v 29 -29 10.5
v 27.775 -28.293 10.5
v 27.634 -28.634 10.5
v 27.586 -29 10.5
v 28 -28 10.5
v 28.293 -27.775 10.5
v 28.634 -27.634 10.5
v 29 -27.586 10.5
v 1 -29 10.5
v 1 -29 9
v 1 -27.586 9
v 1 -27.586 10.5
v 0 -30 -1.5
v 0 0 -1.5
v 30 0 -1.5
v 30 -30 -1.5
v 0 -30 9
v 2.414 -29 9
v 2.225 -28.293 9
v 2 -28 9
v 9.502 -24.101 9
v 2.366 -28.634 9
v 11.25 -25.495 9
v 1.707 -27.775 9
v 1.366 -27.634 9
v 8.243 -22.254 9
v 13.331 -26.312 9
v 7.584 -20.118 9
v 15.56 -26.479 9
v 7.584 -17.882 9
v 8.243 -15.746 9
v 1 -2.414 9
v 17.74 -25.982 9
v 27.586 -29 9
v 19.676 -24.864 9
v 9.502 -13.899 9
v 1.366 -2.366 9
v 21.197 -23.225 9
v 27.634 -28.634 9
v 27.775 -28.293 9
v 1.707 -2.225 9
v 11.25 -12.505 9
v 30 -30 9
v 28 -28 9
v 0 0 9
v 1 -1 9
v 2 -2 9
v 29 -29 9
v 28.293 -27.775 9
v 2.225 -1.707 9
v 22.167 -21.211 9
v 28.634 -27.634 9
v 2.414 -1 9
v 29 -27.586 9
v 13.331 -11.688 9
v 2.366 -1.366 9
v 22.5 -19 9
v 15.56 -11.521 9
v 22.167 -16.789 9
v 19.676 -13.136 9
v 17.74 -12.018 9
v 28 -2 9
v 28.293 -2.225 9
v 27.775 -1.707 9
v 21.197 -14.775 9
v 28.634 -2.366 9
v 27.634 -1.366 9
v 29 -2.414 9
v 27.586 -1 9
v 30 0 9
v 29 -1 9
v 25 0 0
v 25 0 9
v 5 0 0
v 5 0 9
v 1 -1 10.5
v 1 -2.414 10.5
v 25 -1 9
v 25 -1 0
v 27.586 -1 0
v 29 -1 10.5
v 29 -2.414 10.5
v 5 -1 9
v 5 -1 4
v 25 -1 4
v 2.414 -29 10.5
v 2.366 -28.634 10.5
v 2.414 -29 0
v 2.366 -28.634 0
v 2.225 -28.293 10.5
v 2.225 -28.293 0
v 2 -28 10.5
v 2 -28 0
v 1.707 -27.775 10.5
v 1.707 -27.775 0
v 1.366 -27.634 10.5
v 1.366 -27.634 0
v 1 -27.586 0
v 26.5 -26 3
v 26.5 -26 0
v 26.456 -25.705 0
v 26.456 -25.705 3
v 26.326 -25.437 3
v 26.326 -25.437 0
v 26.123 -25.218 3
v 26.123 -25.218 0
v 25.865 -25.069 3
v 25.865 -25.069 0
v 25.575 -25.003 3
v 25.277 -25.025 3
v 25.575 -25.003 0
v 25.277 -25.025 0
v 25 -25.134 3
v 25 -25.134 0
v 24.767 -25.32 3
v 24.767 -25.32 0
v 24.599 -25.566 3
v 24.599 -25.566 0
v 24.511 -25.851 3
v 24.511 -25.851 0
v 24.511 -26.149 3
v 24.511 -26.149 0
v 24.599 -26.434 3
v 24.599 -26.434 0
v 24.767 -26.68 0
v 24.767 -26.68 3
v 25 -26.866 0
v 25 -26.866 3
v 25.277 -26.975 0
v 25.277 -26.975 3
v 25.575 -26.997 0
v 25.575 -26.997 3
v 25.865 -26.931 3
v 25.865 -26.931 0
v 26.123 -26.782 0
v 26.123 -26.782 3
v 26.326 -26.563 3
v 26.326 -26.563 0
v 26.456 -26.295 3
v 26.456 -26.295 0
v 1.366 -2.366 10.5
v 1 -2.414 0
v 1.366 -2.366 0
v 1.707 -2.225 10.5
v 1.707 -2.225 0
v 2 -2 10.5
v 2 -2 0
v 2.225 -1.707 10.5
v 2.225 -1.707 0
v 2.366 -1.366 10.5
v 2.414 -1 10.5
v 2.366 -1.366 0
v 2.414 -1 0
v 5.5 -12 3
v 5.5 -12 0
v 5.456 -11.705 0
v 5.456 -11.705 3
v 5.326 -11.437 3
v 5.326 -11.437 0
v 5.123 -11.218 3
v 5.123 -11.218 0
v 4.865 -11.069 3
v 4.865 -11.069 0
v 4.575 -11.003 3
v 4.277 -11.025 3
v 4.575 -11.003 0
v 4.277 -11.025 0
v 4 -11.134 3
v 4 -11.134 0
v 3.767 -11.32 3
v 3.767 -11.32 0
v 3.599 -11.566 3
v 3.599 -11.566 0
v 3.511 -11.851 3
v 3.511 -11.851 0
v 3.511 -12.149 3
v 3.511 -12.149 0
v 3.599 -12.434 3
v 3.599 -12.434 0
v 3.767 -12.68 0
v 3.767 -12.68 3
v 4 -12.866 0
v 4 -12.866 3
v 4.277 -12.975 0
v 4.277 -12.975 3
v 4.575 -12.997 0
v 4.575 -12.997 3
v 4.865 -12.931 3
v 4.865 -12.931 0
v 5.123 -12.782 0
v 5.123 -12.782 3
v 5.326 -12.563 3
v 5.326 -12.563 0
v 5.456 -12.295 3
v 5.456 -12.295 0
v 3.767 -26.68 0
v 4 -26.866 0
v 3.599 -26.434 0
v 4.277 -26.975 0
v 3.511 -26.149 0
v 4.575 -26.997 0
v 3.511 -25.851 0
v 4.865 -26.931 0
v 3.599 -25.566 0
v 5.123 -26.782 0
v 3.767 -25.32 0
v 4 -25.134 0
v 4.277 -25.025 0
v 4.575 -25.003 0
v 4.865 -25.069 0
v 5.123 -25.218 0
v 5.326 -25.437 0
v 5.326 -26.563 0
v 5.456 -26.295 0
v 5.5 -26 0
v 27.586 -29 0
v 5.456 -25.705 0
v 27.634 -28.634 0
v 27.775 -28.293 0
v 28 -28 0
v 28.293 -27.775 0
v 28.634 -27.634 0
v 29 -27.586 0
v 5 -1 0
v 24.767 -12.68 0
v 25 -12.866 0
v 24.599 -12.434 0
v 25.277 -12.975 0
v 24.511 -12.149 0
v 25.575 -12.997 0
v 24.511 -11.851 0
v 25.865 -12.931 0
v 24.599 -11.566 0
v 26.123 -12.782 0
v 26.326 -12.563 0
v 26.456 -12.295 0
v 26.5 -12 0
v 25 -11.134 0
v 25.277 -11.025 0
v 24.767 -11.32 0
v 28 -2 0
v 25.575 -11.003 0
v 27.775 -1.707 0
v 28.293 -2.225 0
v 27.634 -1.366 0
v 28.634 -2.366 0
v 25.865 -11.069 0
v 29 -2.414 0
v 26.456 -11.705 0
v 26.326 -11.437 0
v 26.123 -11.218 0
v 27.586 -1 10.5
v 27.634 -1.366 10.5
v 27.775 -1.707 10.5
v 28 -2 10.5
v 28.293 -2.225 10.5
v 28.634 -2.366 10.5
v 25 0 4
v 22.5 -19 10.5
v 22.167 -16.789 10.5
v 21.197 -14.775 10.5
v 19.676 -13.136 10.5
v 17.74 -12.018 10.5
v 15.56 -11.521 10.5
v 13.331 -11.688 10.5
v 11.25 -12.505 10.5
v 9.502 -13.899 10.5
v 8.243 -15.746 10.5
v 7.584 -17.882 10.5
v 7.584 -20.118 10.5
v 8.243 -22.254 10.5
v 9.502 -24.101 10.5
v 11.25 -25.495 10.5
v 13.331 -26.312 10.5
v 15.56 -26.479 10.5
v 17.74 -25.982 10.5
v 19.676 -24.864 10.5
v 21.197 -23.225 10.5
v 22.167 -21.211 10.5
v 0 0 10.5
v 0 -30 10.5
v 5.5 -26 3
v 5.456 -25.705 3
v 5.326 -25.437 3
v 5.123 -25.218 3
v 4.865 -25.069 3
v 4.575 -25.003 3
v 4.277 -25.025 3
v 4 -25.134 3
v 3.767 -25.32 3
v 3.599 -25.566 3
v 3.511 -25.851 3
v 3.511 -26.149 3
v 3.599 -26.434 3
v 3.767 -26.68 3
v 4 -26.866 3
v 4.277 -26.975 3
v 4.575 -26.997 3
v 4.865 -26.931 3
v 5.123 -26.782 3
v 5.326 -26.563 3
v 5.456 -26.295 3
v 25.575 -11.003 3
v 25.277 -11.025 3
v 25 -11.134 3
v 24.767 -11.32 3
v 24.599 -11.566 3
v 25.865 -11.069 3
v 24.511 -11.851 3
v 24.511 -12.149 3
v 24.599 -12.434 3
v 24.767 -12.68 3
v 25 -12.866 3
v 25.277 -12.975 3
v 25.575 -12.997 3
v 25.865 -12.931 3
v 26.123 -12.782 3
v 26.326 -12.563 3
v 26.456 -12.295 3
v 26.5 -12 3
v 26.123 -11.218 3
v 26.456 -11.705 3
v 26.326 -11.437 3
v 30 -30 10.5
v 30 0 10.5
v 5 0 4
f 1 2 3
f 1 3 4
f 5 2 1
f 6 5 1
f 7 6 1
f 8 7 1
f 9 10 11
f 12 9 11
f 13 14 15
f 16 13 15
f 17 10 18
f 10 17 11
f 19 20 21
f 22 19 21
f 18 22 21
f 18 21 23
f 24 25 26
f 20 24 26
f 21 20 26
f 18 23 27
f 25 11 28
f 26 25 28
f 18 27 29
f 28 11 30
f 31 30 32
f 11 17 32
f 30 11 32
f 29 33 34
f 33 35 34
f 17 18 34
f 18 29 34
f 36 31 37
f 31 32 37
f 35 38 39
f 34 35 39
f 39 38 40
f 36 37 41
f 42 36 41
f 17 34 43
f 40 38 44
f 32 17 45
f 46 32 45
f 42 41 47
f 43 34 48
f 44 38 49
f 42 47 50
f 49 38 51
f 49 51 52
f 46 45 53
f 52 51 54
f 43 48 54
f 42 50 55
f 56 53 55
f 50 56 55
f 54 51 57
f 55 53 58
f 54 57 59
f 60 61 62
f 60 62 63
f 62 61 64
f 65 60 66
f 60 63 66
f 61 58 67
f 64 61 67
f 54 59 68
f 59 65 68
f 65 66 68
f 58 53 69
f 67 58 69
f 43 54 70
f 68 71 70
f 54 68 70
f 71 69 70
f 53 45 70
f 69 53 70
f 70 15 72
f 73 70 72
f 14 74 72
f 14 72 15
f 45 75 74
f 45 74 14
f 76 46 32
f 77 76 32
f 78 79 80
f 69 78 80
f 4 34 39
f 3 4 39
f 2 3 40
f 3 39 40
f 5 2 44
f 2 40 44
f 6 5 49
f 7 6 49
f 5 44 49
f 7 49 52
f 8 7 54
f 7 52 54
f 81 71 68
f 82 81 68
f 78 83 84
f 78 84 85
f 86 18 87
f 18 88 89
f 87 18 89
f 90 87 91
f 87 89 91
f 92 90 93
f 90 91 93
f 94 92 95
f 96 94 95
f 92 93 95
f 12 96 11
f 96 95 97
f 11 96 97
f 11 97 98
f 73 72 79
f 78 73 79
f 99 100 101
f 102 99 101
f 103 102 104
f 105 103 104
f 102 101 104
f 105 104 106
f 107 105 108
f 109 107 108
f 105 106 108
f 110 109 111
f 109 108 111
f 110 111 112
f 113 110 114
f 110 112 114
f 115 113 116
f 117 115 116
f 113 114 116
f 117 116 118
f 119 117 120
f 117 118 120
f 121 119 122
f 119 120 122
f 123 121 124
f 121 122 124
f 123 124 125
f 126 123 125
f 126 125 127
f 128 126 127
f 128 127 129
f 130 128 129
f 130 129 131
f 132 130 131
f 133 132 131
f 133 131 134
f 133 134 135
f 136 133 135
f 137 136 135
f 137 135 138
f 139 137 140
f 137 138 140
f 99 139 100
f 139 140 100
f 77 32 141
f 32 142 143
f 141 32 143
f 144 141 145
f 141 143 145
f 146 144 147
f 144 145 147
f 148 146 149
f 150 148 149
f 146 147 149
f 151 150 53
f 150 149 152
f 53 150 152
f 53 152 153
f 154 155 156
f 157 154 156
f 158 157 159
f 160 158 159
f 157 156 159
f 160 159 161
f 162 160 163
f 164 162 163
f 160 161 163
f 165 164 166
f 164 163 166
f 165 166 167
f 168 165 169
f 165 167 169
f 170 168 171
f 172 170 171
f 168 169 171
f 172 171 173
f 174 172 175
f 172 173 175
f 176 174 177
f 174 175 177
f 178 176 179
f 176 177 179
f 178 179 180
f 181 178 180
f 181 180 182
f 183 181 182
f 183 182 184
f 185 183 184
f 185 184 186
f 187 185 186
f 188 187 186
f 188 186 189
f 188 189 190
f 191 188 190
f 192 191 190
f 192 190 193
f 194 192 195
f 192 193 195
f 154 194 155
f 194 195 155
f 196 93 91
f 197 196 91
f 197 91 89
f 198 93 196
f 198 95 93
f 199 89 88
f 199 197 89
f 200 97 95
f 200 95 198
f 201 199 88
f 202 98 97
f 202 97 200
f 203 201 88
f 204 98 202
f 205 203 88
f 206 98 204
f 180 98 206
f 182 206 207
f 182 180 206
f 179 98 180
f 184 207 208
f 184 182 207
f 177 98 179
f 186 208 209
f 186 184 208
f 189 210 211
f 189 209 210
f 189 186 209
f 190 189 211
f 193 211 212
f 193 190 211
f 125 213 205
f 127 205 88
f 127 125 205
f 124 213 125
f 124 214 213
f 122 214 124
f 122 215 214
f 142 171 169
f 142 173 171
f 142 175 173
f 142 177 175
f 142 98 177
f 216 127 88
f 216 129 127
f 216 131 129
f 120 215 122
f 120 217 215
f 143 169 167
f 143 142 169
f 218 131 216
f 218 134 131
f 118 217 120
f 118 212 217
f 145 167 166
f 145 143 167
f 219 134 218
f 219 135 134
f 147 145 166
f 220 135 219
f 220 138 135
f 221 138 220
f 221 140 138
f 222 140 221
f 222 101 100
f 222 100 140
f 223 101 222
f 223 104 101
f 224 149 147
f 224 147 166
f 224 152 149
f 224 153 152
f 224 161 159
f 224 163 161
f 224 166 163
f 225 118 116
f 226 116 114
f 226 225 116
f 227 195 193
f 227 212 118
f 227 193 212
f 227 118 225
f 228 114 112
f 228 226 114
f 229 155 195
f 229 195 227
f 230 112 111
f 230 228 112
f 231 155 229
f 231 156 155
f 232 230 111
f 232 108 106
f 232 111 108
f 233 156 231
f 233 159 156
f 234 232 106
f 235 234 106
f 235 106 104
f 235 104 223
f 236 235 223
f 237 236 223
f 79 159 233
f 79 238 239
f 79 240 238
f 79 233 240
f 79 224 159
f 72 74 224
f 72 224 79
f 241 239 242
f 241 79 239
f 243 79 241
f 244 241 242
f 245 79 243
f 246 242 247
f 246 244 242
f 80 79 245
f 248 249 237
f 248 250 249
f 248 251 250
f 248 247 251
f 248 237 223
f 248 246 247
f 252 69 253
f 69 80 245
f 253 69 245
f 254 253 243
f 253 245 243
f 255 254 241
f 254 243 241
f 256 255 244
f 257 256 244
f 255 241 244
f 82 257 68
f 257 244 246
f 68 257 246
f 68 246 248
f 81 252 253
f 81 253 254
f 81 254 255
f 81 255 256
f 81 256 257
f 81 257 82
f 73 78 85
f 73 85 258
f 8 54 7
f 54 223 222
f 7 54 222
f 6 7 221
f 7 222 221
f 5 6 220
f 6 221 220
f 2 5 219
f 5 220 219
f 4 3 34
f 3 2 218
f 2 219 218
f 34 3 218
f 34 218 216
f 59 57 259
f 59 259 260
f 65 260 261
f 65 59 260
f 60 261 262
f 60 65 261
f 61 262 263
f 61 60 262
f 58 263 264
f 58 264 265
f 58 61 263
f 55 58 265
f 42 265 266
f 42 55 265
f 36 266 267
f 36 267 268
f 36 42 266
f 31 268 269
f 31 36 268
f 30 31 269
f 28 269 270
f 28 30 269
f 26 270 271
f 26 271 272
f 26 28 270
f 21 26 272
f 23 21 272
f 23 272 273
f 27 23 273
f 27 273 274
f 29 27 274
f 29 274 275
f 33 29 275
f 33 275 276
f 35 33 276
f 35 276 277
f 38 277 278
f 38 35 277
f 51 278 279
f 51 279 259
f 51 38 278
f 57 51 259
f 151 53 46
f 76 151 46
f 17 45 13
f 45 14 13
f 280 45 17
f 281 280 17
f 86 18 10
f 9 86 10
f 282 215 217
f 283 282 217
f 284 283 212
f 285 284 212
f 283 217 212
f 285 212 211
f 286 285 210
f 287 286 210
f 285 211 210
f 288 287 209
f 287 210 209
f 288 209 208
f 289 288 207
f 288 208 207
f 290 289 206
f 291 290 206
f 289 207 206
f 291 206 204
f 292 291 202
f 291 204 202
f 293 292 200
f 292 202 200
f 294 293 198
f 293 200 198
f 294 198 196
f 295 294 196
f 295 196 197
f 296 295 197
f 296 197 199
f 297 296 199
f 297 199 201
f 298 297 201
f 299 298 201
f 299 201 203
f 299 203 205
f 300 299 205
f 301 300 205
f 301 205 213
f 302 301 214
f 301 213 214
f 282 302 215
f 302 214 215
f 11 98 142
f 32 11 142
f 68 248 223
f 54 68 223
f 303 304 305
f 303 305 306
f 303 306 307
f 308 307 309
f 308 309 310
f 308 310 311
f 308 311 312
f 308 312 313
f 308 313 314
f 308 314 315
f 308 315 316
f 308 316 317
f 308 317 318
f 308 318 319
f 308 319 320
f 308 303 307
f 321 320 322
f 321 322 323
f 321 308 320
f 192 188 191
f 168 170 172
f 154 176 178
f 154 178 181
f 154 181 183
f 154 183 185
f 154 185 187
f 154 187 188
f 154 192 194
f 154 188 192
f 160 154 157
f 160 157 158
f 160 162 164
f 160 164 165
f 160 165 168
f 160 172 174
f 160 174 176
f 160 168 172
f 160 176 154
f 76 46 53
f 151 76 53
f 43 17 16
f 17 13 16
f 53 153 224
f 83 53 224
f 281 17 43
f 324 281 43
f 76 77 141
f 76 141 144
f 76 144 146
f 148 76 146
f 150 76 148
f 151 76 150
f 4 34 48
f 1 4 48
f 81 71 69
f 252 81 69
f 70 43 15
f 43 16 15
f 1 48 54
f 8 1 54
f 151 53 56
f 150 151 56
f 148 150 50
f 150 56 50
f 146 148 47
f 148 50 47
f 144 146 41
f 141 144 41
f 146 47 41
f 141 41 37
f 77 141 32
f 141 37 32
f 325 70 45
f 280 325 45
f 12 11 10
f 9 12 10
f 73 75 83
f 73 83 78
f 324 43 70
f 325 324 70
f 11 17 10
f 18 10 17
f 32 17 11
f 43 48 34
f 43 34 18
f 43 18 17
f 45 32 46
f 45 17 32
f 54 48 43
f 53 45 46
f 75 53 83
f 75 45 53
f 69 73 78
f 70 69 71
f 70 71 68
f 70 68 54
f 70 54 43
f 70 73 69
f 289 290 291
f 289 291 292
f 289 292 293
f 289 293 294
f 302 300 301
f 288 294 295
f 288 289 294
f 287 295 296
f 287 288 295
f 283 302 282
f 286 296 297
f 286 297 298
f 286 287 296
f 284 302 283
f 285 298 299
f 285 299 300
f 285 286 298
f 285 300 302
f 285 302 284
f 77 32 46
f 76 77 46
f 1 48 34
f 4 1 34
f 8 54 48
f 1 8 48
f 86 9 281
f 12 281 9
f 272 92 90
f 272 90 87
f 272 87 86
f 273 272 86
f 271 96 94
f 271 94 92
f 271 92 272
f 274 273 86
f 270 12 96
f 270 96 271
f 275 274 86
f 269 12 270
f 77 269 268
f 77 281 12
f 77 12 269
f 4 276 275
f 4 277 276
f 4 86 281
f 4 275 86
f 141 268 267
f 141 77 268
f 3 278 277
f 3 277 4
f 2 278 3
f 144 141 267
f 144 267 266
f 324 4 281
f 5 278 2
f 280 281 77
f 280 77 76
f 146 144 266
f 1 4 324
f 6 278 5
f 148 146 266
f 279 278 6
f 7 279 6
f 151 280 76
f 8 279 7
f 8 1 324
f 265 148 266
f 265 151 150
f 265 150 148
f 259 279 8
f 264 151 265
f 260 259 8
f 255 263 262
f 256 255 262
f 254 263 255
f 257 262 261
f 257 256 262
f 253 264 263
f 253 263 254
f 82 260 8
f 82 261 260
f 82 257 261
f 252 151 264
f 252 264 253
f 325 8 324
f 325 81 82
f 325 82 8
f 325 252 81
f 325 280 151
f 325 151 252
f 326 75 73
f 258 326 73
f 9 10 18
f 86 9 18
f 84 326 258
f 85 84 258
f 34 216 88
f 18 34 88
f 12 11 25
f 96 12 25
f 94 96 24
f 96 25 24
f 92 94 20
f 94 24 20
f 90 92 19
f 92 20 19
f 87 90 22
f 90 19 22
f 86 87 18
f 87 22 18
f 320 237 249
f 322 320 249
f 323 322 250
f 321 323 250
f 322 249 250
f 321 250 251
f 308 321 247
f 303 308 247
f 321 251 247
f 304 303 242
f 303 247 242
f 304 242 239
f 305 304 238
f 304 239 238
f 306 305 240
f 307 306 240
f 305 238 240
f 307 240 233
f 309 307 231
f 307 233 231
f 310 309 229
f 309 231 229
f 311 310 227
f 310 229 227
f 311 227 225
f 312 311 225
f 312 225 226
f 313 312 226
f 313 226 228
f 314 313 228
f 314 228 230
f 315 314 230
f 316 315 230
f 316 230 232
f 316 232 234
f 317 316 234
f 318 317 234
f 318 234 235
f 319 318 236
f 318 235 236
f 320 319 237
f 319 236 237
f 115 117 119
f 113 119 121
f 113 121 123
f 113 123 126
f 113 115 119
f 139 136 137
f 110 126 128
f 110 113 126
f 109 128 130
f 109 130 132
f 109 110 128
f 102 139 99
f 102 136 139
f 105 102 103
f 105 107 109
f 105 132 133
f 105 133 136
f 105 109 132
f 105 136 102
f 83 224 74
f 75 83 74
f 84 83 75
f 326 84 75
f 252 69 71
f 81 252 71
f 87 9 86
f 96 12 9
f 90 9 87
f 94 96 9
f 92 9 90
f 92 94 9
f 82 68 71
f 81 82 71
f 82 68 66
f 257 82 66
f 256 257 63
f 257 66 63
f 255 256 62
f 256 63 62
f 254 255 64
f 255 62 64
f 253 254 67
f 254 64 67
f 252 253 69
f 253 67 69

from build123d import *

# Parameters (mm, degrees)
F0_R     = 1
F0_W     = 20
F0_H     = 1
F1_DEPTH = 1.5
F2_DEPTH = 3
F3_DEPTH = 9
F4_W     = 20
F4_H     = 1
F4_R     = 7.5
F5_DEPTH = 1.5
F6_DEPTH = 10.5
F7_DEPTH = 25
F8_DEPTH = 5
F13_R    = 2


with BuildPart() as f1:
    # F0 (on Top) → F1 (new body)
    with BuildSketch(Plane.XY):
        with BuildLine():
            Line((25, -1), (5, -1))
            Line((5, -1), (2.4142135624, -1))
            ThreePointArc((2.4142135624, -1), (2, -2), (1, -2.4142135624))
            Line((1, -2.4142135624), (1, -27.5857864376))
            ThreePointArc((1, -27.5857864376), (2, -28), (2.4142135624, -29))
            Line((2.4142135624, -29), (27.5857864376, -29))
            ThreePointArc((27.5857864376, -29), (28, -28), (29, -27.5857864376))
            Line((29, -27.5857864376), (29, -2.4142135624))
            ThreePointArc((29, -2.4142135624), (28, -2), (27.5857864376, -1))
            Line((27.5857864376, -1), (25, -1))
        make_face()
        with Locations((4.5, -26)):
            Circle(F0_R, mode=Mode.SUBTRACT)
        with Locations((25.5, -26)):
            Circle(F0_R, mode=Mode.SUBTRACT)
        with Locations((4.5, -12)):
            Circle(F0_R, mode=Mode.SUBTRACT)
        with Locations((25.5, -12)):
            Circle(F0_R, mode=Mode.SUBTRACT)
        with BuildLine():
            Line((27.5857864376, -29), (2.4142135624, -29))
            ThreePointArc((2.4142135624, -29), (2.3065629649, -29.5411961001), (2, -30))
            Line((2, -30), (28, -30))
            ThreePointArc((28, -30), (27.6934370351, -29.5411961001), (27.5857864376, -29))
        make_face()
        with BuildLine():
            ThreePointArc((1, -2.4142135624), (0.4588038999, -2.3065629649), (0, -2))
            Line((0, -2), (0, -28))
            ThreePointArc((0, -28), (0.4588038999, -27.6934370351), (1, -27.5857864376))
            Line((1, -27.5857864376), (1, -2.4142135624))
        make_face()
        with BuildLine():
            Line((30, -28), (30, -2))
            ThreePointArc((30, -2), (29.5411961001, -2.3065629649), (29, -2.4142135624))
            Line((29, -2.4142135624), (29, -27.5857864376))
            ThreePointArc((29, -27.5857864376), (29.5411961001, -27.6934370351), (30, -28))
        make_face()
        with Locations((15, -0.5)):
            Rectangle(F0_W, F0_H)
        with BuildLine():
            ThreePointArc((1, -27.5857864376), (0.4588038999, -27.6934370351), (0, -28))
            Line((0, -28), (0, -30))
            Line((0, -30), (2, -30))
            ThreePointArc((2, -30), (2.3065629649, -29.5411961001), (2.4142135624, -29))
            Line((2.4142135624, -29), (1, -29))
            Line((1, -29), (1, -27.5857864376))
        make_face()
        with BuildLine():
            Line((30, -30), (30, -28))
            ThreePointArc((30, -28), (29.5411961001, -27.6934370351), (29, -27.5857864376))
            Line((29, -27.5857864376), (29, -29))
            Line((29, -29), (27.5857864376, -29))
            ThreePointArc((27.5857864376, -29), (27.6934370351, -29.5411961001), (28, -30))
            Line((28, -30), (30, -30))
        make_face()
        with BuildLine():
            ThreePointArc((2.4142135624, -1), (2.3065629649, -0.4588038999), (2, 0))
            Line((2, 0), (0, 0))
            Line((0, 0), (0, -2))
            ThreePointArc((0, -2), (0.4588038999, -2.3065629649), (1, -2.4142135624))
            Line((1, -2.4142135624), (1, -1))
            Line((1, -1), (2.4142135624, -1))
        make_face()
        with BuildLine():
            Line((30, 0), (28, 0))
            ThreePointArc((28, 0), (27.6934370351, -0.4588038999), (27.5857864376, -1))
            Line((27.5857864376, -1), (29, -1))
            Line((29, -1), (29, -2.4142135624))
            ThreePointArc((29, -2.4142135624), (29.5411961001, -2.3065629649), (30, -2))
            Line((30, -2), (30, 0))
        make_face()
        with Locations((4.5, -12)):
            Circle(F0_R)
        with Locations((4.5, -26)):
            Circle(F0_R)
        with Locations((25.5, -26)):
            Circle(F0_R)
        with Locations((25.5, -12)):
            Circle(F0_R)
        with BuildLine():
            Line((28, 0), (25, 0))
            Line((25, 0), (25, -1))
            Line((25, -1), (27.5857864376, -1))
            ThreePointArc((27.5857864376, -1), (27.6934370351, -0.4588038999), (28, 0))
        make_face()
        with BuildLine():
            Line((5, -1), (5, 0))
            Line((5, 0), (2, 0))
            ThreePointArc((2, 0), (2.3065629649, -0.4588038999), (2.4142135624, -1))
            Line((2.4142135624, -1), (5, -1))
        make_face()
        with BuildLine():
            ThreePointArc((1, -2.4142135624), (2, -2), (2.4142135624, -1))
            Line((2.4142135624, -1), (1, -1))
            Line((1, -1), (1, -2.4142135624))
        make_face()
        with BuildLine():
            ThreePointArc((2.4142135624, -29), (2, -28), (1, -27.5857864376))
            Line((1, -27.5857864376), (1, -29))
            Line((1, -29), (2.4142135624, -29))
        make_face()
        with BuildLine():
            Line((29, -29), (29, -27.5857864376))
            ThreePointArc((29, -27.5857864376), (28, -28), (27.5857864376, -29))
            Line((27.5857864376, -29), (29, -29))
        make_face()
        with BuildLine():
            Line((29, -1), (27.5857864376, -1))
            ThreePointArc((27.5857864376, -1), (28, -2), (29, -2.4142135624))
            Line((29, -2.4142135624), (29, -1))
        make_face()
    extrude(amount=-F1_DEPTH)

    # F0 (on Top) → F2 (join)
    with BuildSketch(Plane.XY):
        with Locations((4.5, -12)):
            Circle(F0_R)
        with Locations((25.5, -12)):
            Circle(F0_R)
        with Locations((25.5, -26)):
            Circle(F0_R)
        with Locations((4.5, -26)):
            Circle(F0_R)
    extrude(amount=F2_DEPTH)

    # F0 (on Top) → F3 (join)
    with BuildSketch(Plane.XY):
        with BuildLine():
            ThreePointArc((1, -27.5857864376), (0.4588038999, -27.6934370351), (0, -28))
            Line((0, -28), (0, -30))
            Line((0, -30), (2, -30))
            ThreePointArc((2, -30), (2.3065629649, -29.5411961001), (2.4142135624, -29))
            Line((2.4142135624, -29), (1, -29))
            Line((1, -29), (1, -27.5857864376))
        make_face()
        with BuildLine():
            Line((27.5857864376, -29), (2.4142135624, -29))
            ThreePointArc((2.4142135624, -29), (2.3065629649, -29.5411961001), (2, -30))
            Line((2, -30), (28, -30))
            ThreePointArc((28, -30), (27.6934370351, -29.5411961001), (27.5857864376, -29))
        make_face()
        with BuildLine():
            Line((30, -30), (30, -28))
            ThreePointArc((30, -28), (29.5411961001, -27.6934370351), (29, -27.5857864376))
            Line((29, -27.5857864376), (29, -29))
            Line((29, -29), (27.5857864376, -29))
            ThreePointArc((27.5857864376, -29), (27.6934370351, -29.5411961001), (28, -30))
            Line((28, -30), (30, -30))
        make_face()
        with BuildLine():
            Line((30, -28), (30, -2))
            ThreePointArc((30, -2), (29.5411961001, -2.3065629649), (29, -2.4142135624))
            Line((29, -2.4142135624), (29, -27.5857864376))
            ThreePointArc((29, -27.5857864376), (29.5411961001, -27.6934370351), (30, -28))
        make_face()
        with BuildLine():
            Line((30, 0), (28, 0))
            ThreePointArc((28, 0), (27.6934370351, -0.4588038999), (27.5857864376, -1))
            Line((27.5857864376, -1), (29, -1))
            Line((29, -1), (29, -2.4142135624))
            ThreePointArc((29, -2.4142135624), (29.5411961001, -2.3065629649), (30, -2))
            Line((30, -2), (30, 0))
        make_face()
        with BuildLine():
            Line((28, 0), (25, 0))
            Line((25, 0), (25, -1))
            Line((25, -1), (27.5857864376, -1))
            ThreePointArc((27.5857864376, -1), (27.6934370351, -0.4588038999), (28, 0))
        make_face()
        with BuildLine():
            Line((5, -1), (5, 0))
            Line((5, 0), (2, 0))
            ThreePointArc((2, 0), (2.3065629649, -0.4588038999), (2.4142135624, -1))
            Line((2.4142135624, -1), (5, -1))
        make_face()
        with BuildLine():
            ThreePointArc((2.4142135624, -1), (2.3065629649, -0.4588038999), (2, 0))
            Line((2, 0), (0, 0))
            Line((0, 0), (0, -2))
            ThreePointArc((0, -2), (0.4588038999, -2.3065629649), (1, -2.4142135624))
            Line((1, -2.4142135624), (1, -1))
            Line((1, -1), (2.4142135624, -1))
        make_face()
        with BuildLine():
            ThreePointArc((1, -2.4142135624), (0.4588038999, -2.3065629649), (0, -2))
            Line((0, -2), (0, -28))
            ThreePointArc((0, -28), (0.4588038999, -27.6934370351), (1, -27.5857864376))
            Line((1, -27.5857864376), (1, -2.4142135624))
        make_face()
    extrude(amount=F3_DEPTH)

    # F0 (on Top) → F6 (join)
    with BuildSketch(Plane.XY):
        with BuildLine():
            ThreePointArc((1, -2.4142135624), (2, -2), (2.4142135624, -1))
            Line((2.4142135624, -1), (1, -1))
            Line((1, -1), (1, -2.4142135624))
        make_face()
        with BuildLine():
            ThreePointArc((2.4142135624, -29), (2, -28), (1, -27.5857864376))
            Line((1, -27.5857864376), (1, -29))
            Line((1, -29), (2.4142135624, -29))
        make_face()
        with BuildLine():
            Line((29, -29), (29, -27.5857864376))
            ThreePointArc((29, -27.5857864376), (28, -28), (27.5857864376, -29))
            Line((27.5857864376, -29), (29, -29))
        make_face()
        with BuildLine():
            Line((29, -1), (27.5857864376, -1))
            ThreePointArc((27.5857864376, -1), (28, -2), (29, -2.4142135624))
            Line((29, -2.4142135624), (29, -1))
        make_face()
    extrude(amount=F6_DEPTH)

    # F7 (cut): faces of the model
    f7_faces = [f1.faces().sort_by_distance(p)[0] for p in [
        (28.3997891226, -1.6002108774, 10.5),
        (1.6002108774, -1.6002108774, 10.5),
        (1.6002108774, -28.3997891226, 10.5),
        (28.3997891226, -28.3997891226, 10.5),
    ]]
    extrude(f7_faces, amount=F7_DEPTH, mode=Mode.SUBTRACT)


with BuildPart() as f5:
    # F4 (on face) → F5 (new body)
    with BuildSketch(Plane.XY.offset(9)):
        with Locations((15, -0.5)):
            Rectangle(F4_W, F4_H)
        Polygon((30, 0), (25, 0), (25, -1), (27.5857864376, -1), (29, -1), (29, -2.4142135624), (29, -27.5857864376), (29, -29), (27.5857864376, -29), (2.4142135624, -29), (1, -29), (1, -27.5857864376), (1, -2.4142135624), (1, -1), (2.4142135624, -1), (5, -1), (5, 0), (0, 0), (0, -30), (30, -30), align=None)
        with BuildLine():
            Line((27.5857864376, -1), (25, -1))
            Line((25, -1), (5, -1))
            Line((5, -1), (2.4142135624, -1))
            ThreePointArc((2.4142135624, -1), (2, -2), (1, -2.4142135624))
            Line((1, -2.4142135624), (1, -27.5857864376))
            ThreePointArc((1, -27.5857864376), (2, -28), (2.4142135624, -29))
            Line((2.4142135624, -29), (27.5857864376, -29))
            ThreePointArc((27.5857864376, -29), (28, -28), (29, -27.5857864376))
            Line((29, -27.5857864376), (29, -2.4142135624))
            ThreePointArc((29, -2.4142135624), (28, -2), (27.5857864376, -1))
        make_face()
        with Locations((15, -19)):
            Circle(F4_R, mode=Mode.SUBTRACT)
    extrude(amount=F5_DEPTH)


with BuildPart() as f8:
    # F4 (on face) → F8 (new body)
    with BuildSketch(Plane.XY.offset(9)):
        with Locations((15, -0.5)):
            Rectangle(F4_W, F4_H)
    extrude(amount=-F8_DEPTH)


with BuildPart() as f11:
    # F9 (on Right) → F11 (revolve)
    with BuildSketch(Plane.YZ):
        with BuildLine():
            Line((15.2258750796, -40.7793708146), (25.2258750796, -40.7793708146))
            ThreePointArc((25.2258750796, -40.7793708146), (21.3738474037, -35.9129389037), (15.7530112624, -38.5447591543))
            Line((15.7530112624, -38.5447591543), (9.7055286169, -38.5447591543))
            Line((9.7055286169, -38.5447591543), (9.7055286169, -36.1464507878))
            Line((9.7055286169, -36.1464507878), (5.4970784113, -36.1464507878))
            Line((5.4970784113, -36.1464507878), (5.4970784113, -40.7793708146))
            Line((5.4970784113, -40.7793708146), (15.2258750796, -40.7793708146))
        make_face()
    revolve(axis=Axis((0, 20.2258750796, -40.7793708146), (0, 1, 0)))


with BuildPart() as f12:
    # F10 (on Right) → F12 (revolve)
    with BuildSketch(Plane.YZ):
        with BuildLine():
            ThreePointArc((18.9868118614, -35.8321774343), (23.3636113326, -36.7588470668), (25.3258750796, -40.7793708146))
            Line((25.3258750796, -40.7793708146), (26.2448396534, -40.7793708146))
            Line((26.2448396534, -40.7793708146), (30.2728638053, -40.7793708146))
            Line((30.2728638053, -40.7793708146), (30.2728638053, -38.8744622469))
            Line((30.2728638053, -38.8744622469), (26.2448396534, -38.8744622469))
            Line((26.2448396534, -38.8744622469), (26.2448396534, -34.7860343754))
            Line((26.2448396534, -34.7860343754), (18.9868118614, -34.7860343754))
            Line((18.9868118614, -34.7860343754), (18.9868118614, -35.8321774343))
        make_face()
    revolve(axis=Axis((0, 28.2588517293, -40.7793708146), (0, 1, 0)))

    # F13
    f13_edges = [f12.edges().sort_by_distance(p)[0] for p in [
        (0, 26.24484, -42.684279),
    ]]
    fillet(f13_edges, radius=F13_R)


solid = Compound([f1.part, f5.part, f8.part])
